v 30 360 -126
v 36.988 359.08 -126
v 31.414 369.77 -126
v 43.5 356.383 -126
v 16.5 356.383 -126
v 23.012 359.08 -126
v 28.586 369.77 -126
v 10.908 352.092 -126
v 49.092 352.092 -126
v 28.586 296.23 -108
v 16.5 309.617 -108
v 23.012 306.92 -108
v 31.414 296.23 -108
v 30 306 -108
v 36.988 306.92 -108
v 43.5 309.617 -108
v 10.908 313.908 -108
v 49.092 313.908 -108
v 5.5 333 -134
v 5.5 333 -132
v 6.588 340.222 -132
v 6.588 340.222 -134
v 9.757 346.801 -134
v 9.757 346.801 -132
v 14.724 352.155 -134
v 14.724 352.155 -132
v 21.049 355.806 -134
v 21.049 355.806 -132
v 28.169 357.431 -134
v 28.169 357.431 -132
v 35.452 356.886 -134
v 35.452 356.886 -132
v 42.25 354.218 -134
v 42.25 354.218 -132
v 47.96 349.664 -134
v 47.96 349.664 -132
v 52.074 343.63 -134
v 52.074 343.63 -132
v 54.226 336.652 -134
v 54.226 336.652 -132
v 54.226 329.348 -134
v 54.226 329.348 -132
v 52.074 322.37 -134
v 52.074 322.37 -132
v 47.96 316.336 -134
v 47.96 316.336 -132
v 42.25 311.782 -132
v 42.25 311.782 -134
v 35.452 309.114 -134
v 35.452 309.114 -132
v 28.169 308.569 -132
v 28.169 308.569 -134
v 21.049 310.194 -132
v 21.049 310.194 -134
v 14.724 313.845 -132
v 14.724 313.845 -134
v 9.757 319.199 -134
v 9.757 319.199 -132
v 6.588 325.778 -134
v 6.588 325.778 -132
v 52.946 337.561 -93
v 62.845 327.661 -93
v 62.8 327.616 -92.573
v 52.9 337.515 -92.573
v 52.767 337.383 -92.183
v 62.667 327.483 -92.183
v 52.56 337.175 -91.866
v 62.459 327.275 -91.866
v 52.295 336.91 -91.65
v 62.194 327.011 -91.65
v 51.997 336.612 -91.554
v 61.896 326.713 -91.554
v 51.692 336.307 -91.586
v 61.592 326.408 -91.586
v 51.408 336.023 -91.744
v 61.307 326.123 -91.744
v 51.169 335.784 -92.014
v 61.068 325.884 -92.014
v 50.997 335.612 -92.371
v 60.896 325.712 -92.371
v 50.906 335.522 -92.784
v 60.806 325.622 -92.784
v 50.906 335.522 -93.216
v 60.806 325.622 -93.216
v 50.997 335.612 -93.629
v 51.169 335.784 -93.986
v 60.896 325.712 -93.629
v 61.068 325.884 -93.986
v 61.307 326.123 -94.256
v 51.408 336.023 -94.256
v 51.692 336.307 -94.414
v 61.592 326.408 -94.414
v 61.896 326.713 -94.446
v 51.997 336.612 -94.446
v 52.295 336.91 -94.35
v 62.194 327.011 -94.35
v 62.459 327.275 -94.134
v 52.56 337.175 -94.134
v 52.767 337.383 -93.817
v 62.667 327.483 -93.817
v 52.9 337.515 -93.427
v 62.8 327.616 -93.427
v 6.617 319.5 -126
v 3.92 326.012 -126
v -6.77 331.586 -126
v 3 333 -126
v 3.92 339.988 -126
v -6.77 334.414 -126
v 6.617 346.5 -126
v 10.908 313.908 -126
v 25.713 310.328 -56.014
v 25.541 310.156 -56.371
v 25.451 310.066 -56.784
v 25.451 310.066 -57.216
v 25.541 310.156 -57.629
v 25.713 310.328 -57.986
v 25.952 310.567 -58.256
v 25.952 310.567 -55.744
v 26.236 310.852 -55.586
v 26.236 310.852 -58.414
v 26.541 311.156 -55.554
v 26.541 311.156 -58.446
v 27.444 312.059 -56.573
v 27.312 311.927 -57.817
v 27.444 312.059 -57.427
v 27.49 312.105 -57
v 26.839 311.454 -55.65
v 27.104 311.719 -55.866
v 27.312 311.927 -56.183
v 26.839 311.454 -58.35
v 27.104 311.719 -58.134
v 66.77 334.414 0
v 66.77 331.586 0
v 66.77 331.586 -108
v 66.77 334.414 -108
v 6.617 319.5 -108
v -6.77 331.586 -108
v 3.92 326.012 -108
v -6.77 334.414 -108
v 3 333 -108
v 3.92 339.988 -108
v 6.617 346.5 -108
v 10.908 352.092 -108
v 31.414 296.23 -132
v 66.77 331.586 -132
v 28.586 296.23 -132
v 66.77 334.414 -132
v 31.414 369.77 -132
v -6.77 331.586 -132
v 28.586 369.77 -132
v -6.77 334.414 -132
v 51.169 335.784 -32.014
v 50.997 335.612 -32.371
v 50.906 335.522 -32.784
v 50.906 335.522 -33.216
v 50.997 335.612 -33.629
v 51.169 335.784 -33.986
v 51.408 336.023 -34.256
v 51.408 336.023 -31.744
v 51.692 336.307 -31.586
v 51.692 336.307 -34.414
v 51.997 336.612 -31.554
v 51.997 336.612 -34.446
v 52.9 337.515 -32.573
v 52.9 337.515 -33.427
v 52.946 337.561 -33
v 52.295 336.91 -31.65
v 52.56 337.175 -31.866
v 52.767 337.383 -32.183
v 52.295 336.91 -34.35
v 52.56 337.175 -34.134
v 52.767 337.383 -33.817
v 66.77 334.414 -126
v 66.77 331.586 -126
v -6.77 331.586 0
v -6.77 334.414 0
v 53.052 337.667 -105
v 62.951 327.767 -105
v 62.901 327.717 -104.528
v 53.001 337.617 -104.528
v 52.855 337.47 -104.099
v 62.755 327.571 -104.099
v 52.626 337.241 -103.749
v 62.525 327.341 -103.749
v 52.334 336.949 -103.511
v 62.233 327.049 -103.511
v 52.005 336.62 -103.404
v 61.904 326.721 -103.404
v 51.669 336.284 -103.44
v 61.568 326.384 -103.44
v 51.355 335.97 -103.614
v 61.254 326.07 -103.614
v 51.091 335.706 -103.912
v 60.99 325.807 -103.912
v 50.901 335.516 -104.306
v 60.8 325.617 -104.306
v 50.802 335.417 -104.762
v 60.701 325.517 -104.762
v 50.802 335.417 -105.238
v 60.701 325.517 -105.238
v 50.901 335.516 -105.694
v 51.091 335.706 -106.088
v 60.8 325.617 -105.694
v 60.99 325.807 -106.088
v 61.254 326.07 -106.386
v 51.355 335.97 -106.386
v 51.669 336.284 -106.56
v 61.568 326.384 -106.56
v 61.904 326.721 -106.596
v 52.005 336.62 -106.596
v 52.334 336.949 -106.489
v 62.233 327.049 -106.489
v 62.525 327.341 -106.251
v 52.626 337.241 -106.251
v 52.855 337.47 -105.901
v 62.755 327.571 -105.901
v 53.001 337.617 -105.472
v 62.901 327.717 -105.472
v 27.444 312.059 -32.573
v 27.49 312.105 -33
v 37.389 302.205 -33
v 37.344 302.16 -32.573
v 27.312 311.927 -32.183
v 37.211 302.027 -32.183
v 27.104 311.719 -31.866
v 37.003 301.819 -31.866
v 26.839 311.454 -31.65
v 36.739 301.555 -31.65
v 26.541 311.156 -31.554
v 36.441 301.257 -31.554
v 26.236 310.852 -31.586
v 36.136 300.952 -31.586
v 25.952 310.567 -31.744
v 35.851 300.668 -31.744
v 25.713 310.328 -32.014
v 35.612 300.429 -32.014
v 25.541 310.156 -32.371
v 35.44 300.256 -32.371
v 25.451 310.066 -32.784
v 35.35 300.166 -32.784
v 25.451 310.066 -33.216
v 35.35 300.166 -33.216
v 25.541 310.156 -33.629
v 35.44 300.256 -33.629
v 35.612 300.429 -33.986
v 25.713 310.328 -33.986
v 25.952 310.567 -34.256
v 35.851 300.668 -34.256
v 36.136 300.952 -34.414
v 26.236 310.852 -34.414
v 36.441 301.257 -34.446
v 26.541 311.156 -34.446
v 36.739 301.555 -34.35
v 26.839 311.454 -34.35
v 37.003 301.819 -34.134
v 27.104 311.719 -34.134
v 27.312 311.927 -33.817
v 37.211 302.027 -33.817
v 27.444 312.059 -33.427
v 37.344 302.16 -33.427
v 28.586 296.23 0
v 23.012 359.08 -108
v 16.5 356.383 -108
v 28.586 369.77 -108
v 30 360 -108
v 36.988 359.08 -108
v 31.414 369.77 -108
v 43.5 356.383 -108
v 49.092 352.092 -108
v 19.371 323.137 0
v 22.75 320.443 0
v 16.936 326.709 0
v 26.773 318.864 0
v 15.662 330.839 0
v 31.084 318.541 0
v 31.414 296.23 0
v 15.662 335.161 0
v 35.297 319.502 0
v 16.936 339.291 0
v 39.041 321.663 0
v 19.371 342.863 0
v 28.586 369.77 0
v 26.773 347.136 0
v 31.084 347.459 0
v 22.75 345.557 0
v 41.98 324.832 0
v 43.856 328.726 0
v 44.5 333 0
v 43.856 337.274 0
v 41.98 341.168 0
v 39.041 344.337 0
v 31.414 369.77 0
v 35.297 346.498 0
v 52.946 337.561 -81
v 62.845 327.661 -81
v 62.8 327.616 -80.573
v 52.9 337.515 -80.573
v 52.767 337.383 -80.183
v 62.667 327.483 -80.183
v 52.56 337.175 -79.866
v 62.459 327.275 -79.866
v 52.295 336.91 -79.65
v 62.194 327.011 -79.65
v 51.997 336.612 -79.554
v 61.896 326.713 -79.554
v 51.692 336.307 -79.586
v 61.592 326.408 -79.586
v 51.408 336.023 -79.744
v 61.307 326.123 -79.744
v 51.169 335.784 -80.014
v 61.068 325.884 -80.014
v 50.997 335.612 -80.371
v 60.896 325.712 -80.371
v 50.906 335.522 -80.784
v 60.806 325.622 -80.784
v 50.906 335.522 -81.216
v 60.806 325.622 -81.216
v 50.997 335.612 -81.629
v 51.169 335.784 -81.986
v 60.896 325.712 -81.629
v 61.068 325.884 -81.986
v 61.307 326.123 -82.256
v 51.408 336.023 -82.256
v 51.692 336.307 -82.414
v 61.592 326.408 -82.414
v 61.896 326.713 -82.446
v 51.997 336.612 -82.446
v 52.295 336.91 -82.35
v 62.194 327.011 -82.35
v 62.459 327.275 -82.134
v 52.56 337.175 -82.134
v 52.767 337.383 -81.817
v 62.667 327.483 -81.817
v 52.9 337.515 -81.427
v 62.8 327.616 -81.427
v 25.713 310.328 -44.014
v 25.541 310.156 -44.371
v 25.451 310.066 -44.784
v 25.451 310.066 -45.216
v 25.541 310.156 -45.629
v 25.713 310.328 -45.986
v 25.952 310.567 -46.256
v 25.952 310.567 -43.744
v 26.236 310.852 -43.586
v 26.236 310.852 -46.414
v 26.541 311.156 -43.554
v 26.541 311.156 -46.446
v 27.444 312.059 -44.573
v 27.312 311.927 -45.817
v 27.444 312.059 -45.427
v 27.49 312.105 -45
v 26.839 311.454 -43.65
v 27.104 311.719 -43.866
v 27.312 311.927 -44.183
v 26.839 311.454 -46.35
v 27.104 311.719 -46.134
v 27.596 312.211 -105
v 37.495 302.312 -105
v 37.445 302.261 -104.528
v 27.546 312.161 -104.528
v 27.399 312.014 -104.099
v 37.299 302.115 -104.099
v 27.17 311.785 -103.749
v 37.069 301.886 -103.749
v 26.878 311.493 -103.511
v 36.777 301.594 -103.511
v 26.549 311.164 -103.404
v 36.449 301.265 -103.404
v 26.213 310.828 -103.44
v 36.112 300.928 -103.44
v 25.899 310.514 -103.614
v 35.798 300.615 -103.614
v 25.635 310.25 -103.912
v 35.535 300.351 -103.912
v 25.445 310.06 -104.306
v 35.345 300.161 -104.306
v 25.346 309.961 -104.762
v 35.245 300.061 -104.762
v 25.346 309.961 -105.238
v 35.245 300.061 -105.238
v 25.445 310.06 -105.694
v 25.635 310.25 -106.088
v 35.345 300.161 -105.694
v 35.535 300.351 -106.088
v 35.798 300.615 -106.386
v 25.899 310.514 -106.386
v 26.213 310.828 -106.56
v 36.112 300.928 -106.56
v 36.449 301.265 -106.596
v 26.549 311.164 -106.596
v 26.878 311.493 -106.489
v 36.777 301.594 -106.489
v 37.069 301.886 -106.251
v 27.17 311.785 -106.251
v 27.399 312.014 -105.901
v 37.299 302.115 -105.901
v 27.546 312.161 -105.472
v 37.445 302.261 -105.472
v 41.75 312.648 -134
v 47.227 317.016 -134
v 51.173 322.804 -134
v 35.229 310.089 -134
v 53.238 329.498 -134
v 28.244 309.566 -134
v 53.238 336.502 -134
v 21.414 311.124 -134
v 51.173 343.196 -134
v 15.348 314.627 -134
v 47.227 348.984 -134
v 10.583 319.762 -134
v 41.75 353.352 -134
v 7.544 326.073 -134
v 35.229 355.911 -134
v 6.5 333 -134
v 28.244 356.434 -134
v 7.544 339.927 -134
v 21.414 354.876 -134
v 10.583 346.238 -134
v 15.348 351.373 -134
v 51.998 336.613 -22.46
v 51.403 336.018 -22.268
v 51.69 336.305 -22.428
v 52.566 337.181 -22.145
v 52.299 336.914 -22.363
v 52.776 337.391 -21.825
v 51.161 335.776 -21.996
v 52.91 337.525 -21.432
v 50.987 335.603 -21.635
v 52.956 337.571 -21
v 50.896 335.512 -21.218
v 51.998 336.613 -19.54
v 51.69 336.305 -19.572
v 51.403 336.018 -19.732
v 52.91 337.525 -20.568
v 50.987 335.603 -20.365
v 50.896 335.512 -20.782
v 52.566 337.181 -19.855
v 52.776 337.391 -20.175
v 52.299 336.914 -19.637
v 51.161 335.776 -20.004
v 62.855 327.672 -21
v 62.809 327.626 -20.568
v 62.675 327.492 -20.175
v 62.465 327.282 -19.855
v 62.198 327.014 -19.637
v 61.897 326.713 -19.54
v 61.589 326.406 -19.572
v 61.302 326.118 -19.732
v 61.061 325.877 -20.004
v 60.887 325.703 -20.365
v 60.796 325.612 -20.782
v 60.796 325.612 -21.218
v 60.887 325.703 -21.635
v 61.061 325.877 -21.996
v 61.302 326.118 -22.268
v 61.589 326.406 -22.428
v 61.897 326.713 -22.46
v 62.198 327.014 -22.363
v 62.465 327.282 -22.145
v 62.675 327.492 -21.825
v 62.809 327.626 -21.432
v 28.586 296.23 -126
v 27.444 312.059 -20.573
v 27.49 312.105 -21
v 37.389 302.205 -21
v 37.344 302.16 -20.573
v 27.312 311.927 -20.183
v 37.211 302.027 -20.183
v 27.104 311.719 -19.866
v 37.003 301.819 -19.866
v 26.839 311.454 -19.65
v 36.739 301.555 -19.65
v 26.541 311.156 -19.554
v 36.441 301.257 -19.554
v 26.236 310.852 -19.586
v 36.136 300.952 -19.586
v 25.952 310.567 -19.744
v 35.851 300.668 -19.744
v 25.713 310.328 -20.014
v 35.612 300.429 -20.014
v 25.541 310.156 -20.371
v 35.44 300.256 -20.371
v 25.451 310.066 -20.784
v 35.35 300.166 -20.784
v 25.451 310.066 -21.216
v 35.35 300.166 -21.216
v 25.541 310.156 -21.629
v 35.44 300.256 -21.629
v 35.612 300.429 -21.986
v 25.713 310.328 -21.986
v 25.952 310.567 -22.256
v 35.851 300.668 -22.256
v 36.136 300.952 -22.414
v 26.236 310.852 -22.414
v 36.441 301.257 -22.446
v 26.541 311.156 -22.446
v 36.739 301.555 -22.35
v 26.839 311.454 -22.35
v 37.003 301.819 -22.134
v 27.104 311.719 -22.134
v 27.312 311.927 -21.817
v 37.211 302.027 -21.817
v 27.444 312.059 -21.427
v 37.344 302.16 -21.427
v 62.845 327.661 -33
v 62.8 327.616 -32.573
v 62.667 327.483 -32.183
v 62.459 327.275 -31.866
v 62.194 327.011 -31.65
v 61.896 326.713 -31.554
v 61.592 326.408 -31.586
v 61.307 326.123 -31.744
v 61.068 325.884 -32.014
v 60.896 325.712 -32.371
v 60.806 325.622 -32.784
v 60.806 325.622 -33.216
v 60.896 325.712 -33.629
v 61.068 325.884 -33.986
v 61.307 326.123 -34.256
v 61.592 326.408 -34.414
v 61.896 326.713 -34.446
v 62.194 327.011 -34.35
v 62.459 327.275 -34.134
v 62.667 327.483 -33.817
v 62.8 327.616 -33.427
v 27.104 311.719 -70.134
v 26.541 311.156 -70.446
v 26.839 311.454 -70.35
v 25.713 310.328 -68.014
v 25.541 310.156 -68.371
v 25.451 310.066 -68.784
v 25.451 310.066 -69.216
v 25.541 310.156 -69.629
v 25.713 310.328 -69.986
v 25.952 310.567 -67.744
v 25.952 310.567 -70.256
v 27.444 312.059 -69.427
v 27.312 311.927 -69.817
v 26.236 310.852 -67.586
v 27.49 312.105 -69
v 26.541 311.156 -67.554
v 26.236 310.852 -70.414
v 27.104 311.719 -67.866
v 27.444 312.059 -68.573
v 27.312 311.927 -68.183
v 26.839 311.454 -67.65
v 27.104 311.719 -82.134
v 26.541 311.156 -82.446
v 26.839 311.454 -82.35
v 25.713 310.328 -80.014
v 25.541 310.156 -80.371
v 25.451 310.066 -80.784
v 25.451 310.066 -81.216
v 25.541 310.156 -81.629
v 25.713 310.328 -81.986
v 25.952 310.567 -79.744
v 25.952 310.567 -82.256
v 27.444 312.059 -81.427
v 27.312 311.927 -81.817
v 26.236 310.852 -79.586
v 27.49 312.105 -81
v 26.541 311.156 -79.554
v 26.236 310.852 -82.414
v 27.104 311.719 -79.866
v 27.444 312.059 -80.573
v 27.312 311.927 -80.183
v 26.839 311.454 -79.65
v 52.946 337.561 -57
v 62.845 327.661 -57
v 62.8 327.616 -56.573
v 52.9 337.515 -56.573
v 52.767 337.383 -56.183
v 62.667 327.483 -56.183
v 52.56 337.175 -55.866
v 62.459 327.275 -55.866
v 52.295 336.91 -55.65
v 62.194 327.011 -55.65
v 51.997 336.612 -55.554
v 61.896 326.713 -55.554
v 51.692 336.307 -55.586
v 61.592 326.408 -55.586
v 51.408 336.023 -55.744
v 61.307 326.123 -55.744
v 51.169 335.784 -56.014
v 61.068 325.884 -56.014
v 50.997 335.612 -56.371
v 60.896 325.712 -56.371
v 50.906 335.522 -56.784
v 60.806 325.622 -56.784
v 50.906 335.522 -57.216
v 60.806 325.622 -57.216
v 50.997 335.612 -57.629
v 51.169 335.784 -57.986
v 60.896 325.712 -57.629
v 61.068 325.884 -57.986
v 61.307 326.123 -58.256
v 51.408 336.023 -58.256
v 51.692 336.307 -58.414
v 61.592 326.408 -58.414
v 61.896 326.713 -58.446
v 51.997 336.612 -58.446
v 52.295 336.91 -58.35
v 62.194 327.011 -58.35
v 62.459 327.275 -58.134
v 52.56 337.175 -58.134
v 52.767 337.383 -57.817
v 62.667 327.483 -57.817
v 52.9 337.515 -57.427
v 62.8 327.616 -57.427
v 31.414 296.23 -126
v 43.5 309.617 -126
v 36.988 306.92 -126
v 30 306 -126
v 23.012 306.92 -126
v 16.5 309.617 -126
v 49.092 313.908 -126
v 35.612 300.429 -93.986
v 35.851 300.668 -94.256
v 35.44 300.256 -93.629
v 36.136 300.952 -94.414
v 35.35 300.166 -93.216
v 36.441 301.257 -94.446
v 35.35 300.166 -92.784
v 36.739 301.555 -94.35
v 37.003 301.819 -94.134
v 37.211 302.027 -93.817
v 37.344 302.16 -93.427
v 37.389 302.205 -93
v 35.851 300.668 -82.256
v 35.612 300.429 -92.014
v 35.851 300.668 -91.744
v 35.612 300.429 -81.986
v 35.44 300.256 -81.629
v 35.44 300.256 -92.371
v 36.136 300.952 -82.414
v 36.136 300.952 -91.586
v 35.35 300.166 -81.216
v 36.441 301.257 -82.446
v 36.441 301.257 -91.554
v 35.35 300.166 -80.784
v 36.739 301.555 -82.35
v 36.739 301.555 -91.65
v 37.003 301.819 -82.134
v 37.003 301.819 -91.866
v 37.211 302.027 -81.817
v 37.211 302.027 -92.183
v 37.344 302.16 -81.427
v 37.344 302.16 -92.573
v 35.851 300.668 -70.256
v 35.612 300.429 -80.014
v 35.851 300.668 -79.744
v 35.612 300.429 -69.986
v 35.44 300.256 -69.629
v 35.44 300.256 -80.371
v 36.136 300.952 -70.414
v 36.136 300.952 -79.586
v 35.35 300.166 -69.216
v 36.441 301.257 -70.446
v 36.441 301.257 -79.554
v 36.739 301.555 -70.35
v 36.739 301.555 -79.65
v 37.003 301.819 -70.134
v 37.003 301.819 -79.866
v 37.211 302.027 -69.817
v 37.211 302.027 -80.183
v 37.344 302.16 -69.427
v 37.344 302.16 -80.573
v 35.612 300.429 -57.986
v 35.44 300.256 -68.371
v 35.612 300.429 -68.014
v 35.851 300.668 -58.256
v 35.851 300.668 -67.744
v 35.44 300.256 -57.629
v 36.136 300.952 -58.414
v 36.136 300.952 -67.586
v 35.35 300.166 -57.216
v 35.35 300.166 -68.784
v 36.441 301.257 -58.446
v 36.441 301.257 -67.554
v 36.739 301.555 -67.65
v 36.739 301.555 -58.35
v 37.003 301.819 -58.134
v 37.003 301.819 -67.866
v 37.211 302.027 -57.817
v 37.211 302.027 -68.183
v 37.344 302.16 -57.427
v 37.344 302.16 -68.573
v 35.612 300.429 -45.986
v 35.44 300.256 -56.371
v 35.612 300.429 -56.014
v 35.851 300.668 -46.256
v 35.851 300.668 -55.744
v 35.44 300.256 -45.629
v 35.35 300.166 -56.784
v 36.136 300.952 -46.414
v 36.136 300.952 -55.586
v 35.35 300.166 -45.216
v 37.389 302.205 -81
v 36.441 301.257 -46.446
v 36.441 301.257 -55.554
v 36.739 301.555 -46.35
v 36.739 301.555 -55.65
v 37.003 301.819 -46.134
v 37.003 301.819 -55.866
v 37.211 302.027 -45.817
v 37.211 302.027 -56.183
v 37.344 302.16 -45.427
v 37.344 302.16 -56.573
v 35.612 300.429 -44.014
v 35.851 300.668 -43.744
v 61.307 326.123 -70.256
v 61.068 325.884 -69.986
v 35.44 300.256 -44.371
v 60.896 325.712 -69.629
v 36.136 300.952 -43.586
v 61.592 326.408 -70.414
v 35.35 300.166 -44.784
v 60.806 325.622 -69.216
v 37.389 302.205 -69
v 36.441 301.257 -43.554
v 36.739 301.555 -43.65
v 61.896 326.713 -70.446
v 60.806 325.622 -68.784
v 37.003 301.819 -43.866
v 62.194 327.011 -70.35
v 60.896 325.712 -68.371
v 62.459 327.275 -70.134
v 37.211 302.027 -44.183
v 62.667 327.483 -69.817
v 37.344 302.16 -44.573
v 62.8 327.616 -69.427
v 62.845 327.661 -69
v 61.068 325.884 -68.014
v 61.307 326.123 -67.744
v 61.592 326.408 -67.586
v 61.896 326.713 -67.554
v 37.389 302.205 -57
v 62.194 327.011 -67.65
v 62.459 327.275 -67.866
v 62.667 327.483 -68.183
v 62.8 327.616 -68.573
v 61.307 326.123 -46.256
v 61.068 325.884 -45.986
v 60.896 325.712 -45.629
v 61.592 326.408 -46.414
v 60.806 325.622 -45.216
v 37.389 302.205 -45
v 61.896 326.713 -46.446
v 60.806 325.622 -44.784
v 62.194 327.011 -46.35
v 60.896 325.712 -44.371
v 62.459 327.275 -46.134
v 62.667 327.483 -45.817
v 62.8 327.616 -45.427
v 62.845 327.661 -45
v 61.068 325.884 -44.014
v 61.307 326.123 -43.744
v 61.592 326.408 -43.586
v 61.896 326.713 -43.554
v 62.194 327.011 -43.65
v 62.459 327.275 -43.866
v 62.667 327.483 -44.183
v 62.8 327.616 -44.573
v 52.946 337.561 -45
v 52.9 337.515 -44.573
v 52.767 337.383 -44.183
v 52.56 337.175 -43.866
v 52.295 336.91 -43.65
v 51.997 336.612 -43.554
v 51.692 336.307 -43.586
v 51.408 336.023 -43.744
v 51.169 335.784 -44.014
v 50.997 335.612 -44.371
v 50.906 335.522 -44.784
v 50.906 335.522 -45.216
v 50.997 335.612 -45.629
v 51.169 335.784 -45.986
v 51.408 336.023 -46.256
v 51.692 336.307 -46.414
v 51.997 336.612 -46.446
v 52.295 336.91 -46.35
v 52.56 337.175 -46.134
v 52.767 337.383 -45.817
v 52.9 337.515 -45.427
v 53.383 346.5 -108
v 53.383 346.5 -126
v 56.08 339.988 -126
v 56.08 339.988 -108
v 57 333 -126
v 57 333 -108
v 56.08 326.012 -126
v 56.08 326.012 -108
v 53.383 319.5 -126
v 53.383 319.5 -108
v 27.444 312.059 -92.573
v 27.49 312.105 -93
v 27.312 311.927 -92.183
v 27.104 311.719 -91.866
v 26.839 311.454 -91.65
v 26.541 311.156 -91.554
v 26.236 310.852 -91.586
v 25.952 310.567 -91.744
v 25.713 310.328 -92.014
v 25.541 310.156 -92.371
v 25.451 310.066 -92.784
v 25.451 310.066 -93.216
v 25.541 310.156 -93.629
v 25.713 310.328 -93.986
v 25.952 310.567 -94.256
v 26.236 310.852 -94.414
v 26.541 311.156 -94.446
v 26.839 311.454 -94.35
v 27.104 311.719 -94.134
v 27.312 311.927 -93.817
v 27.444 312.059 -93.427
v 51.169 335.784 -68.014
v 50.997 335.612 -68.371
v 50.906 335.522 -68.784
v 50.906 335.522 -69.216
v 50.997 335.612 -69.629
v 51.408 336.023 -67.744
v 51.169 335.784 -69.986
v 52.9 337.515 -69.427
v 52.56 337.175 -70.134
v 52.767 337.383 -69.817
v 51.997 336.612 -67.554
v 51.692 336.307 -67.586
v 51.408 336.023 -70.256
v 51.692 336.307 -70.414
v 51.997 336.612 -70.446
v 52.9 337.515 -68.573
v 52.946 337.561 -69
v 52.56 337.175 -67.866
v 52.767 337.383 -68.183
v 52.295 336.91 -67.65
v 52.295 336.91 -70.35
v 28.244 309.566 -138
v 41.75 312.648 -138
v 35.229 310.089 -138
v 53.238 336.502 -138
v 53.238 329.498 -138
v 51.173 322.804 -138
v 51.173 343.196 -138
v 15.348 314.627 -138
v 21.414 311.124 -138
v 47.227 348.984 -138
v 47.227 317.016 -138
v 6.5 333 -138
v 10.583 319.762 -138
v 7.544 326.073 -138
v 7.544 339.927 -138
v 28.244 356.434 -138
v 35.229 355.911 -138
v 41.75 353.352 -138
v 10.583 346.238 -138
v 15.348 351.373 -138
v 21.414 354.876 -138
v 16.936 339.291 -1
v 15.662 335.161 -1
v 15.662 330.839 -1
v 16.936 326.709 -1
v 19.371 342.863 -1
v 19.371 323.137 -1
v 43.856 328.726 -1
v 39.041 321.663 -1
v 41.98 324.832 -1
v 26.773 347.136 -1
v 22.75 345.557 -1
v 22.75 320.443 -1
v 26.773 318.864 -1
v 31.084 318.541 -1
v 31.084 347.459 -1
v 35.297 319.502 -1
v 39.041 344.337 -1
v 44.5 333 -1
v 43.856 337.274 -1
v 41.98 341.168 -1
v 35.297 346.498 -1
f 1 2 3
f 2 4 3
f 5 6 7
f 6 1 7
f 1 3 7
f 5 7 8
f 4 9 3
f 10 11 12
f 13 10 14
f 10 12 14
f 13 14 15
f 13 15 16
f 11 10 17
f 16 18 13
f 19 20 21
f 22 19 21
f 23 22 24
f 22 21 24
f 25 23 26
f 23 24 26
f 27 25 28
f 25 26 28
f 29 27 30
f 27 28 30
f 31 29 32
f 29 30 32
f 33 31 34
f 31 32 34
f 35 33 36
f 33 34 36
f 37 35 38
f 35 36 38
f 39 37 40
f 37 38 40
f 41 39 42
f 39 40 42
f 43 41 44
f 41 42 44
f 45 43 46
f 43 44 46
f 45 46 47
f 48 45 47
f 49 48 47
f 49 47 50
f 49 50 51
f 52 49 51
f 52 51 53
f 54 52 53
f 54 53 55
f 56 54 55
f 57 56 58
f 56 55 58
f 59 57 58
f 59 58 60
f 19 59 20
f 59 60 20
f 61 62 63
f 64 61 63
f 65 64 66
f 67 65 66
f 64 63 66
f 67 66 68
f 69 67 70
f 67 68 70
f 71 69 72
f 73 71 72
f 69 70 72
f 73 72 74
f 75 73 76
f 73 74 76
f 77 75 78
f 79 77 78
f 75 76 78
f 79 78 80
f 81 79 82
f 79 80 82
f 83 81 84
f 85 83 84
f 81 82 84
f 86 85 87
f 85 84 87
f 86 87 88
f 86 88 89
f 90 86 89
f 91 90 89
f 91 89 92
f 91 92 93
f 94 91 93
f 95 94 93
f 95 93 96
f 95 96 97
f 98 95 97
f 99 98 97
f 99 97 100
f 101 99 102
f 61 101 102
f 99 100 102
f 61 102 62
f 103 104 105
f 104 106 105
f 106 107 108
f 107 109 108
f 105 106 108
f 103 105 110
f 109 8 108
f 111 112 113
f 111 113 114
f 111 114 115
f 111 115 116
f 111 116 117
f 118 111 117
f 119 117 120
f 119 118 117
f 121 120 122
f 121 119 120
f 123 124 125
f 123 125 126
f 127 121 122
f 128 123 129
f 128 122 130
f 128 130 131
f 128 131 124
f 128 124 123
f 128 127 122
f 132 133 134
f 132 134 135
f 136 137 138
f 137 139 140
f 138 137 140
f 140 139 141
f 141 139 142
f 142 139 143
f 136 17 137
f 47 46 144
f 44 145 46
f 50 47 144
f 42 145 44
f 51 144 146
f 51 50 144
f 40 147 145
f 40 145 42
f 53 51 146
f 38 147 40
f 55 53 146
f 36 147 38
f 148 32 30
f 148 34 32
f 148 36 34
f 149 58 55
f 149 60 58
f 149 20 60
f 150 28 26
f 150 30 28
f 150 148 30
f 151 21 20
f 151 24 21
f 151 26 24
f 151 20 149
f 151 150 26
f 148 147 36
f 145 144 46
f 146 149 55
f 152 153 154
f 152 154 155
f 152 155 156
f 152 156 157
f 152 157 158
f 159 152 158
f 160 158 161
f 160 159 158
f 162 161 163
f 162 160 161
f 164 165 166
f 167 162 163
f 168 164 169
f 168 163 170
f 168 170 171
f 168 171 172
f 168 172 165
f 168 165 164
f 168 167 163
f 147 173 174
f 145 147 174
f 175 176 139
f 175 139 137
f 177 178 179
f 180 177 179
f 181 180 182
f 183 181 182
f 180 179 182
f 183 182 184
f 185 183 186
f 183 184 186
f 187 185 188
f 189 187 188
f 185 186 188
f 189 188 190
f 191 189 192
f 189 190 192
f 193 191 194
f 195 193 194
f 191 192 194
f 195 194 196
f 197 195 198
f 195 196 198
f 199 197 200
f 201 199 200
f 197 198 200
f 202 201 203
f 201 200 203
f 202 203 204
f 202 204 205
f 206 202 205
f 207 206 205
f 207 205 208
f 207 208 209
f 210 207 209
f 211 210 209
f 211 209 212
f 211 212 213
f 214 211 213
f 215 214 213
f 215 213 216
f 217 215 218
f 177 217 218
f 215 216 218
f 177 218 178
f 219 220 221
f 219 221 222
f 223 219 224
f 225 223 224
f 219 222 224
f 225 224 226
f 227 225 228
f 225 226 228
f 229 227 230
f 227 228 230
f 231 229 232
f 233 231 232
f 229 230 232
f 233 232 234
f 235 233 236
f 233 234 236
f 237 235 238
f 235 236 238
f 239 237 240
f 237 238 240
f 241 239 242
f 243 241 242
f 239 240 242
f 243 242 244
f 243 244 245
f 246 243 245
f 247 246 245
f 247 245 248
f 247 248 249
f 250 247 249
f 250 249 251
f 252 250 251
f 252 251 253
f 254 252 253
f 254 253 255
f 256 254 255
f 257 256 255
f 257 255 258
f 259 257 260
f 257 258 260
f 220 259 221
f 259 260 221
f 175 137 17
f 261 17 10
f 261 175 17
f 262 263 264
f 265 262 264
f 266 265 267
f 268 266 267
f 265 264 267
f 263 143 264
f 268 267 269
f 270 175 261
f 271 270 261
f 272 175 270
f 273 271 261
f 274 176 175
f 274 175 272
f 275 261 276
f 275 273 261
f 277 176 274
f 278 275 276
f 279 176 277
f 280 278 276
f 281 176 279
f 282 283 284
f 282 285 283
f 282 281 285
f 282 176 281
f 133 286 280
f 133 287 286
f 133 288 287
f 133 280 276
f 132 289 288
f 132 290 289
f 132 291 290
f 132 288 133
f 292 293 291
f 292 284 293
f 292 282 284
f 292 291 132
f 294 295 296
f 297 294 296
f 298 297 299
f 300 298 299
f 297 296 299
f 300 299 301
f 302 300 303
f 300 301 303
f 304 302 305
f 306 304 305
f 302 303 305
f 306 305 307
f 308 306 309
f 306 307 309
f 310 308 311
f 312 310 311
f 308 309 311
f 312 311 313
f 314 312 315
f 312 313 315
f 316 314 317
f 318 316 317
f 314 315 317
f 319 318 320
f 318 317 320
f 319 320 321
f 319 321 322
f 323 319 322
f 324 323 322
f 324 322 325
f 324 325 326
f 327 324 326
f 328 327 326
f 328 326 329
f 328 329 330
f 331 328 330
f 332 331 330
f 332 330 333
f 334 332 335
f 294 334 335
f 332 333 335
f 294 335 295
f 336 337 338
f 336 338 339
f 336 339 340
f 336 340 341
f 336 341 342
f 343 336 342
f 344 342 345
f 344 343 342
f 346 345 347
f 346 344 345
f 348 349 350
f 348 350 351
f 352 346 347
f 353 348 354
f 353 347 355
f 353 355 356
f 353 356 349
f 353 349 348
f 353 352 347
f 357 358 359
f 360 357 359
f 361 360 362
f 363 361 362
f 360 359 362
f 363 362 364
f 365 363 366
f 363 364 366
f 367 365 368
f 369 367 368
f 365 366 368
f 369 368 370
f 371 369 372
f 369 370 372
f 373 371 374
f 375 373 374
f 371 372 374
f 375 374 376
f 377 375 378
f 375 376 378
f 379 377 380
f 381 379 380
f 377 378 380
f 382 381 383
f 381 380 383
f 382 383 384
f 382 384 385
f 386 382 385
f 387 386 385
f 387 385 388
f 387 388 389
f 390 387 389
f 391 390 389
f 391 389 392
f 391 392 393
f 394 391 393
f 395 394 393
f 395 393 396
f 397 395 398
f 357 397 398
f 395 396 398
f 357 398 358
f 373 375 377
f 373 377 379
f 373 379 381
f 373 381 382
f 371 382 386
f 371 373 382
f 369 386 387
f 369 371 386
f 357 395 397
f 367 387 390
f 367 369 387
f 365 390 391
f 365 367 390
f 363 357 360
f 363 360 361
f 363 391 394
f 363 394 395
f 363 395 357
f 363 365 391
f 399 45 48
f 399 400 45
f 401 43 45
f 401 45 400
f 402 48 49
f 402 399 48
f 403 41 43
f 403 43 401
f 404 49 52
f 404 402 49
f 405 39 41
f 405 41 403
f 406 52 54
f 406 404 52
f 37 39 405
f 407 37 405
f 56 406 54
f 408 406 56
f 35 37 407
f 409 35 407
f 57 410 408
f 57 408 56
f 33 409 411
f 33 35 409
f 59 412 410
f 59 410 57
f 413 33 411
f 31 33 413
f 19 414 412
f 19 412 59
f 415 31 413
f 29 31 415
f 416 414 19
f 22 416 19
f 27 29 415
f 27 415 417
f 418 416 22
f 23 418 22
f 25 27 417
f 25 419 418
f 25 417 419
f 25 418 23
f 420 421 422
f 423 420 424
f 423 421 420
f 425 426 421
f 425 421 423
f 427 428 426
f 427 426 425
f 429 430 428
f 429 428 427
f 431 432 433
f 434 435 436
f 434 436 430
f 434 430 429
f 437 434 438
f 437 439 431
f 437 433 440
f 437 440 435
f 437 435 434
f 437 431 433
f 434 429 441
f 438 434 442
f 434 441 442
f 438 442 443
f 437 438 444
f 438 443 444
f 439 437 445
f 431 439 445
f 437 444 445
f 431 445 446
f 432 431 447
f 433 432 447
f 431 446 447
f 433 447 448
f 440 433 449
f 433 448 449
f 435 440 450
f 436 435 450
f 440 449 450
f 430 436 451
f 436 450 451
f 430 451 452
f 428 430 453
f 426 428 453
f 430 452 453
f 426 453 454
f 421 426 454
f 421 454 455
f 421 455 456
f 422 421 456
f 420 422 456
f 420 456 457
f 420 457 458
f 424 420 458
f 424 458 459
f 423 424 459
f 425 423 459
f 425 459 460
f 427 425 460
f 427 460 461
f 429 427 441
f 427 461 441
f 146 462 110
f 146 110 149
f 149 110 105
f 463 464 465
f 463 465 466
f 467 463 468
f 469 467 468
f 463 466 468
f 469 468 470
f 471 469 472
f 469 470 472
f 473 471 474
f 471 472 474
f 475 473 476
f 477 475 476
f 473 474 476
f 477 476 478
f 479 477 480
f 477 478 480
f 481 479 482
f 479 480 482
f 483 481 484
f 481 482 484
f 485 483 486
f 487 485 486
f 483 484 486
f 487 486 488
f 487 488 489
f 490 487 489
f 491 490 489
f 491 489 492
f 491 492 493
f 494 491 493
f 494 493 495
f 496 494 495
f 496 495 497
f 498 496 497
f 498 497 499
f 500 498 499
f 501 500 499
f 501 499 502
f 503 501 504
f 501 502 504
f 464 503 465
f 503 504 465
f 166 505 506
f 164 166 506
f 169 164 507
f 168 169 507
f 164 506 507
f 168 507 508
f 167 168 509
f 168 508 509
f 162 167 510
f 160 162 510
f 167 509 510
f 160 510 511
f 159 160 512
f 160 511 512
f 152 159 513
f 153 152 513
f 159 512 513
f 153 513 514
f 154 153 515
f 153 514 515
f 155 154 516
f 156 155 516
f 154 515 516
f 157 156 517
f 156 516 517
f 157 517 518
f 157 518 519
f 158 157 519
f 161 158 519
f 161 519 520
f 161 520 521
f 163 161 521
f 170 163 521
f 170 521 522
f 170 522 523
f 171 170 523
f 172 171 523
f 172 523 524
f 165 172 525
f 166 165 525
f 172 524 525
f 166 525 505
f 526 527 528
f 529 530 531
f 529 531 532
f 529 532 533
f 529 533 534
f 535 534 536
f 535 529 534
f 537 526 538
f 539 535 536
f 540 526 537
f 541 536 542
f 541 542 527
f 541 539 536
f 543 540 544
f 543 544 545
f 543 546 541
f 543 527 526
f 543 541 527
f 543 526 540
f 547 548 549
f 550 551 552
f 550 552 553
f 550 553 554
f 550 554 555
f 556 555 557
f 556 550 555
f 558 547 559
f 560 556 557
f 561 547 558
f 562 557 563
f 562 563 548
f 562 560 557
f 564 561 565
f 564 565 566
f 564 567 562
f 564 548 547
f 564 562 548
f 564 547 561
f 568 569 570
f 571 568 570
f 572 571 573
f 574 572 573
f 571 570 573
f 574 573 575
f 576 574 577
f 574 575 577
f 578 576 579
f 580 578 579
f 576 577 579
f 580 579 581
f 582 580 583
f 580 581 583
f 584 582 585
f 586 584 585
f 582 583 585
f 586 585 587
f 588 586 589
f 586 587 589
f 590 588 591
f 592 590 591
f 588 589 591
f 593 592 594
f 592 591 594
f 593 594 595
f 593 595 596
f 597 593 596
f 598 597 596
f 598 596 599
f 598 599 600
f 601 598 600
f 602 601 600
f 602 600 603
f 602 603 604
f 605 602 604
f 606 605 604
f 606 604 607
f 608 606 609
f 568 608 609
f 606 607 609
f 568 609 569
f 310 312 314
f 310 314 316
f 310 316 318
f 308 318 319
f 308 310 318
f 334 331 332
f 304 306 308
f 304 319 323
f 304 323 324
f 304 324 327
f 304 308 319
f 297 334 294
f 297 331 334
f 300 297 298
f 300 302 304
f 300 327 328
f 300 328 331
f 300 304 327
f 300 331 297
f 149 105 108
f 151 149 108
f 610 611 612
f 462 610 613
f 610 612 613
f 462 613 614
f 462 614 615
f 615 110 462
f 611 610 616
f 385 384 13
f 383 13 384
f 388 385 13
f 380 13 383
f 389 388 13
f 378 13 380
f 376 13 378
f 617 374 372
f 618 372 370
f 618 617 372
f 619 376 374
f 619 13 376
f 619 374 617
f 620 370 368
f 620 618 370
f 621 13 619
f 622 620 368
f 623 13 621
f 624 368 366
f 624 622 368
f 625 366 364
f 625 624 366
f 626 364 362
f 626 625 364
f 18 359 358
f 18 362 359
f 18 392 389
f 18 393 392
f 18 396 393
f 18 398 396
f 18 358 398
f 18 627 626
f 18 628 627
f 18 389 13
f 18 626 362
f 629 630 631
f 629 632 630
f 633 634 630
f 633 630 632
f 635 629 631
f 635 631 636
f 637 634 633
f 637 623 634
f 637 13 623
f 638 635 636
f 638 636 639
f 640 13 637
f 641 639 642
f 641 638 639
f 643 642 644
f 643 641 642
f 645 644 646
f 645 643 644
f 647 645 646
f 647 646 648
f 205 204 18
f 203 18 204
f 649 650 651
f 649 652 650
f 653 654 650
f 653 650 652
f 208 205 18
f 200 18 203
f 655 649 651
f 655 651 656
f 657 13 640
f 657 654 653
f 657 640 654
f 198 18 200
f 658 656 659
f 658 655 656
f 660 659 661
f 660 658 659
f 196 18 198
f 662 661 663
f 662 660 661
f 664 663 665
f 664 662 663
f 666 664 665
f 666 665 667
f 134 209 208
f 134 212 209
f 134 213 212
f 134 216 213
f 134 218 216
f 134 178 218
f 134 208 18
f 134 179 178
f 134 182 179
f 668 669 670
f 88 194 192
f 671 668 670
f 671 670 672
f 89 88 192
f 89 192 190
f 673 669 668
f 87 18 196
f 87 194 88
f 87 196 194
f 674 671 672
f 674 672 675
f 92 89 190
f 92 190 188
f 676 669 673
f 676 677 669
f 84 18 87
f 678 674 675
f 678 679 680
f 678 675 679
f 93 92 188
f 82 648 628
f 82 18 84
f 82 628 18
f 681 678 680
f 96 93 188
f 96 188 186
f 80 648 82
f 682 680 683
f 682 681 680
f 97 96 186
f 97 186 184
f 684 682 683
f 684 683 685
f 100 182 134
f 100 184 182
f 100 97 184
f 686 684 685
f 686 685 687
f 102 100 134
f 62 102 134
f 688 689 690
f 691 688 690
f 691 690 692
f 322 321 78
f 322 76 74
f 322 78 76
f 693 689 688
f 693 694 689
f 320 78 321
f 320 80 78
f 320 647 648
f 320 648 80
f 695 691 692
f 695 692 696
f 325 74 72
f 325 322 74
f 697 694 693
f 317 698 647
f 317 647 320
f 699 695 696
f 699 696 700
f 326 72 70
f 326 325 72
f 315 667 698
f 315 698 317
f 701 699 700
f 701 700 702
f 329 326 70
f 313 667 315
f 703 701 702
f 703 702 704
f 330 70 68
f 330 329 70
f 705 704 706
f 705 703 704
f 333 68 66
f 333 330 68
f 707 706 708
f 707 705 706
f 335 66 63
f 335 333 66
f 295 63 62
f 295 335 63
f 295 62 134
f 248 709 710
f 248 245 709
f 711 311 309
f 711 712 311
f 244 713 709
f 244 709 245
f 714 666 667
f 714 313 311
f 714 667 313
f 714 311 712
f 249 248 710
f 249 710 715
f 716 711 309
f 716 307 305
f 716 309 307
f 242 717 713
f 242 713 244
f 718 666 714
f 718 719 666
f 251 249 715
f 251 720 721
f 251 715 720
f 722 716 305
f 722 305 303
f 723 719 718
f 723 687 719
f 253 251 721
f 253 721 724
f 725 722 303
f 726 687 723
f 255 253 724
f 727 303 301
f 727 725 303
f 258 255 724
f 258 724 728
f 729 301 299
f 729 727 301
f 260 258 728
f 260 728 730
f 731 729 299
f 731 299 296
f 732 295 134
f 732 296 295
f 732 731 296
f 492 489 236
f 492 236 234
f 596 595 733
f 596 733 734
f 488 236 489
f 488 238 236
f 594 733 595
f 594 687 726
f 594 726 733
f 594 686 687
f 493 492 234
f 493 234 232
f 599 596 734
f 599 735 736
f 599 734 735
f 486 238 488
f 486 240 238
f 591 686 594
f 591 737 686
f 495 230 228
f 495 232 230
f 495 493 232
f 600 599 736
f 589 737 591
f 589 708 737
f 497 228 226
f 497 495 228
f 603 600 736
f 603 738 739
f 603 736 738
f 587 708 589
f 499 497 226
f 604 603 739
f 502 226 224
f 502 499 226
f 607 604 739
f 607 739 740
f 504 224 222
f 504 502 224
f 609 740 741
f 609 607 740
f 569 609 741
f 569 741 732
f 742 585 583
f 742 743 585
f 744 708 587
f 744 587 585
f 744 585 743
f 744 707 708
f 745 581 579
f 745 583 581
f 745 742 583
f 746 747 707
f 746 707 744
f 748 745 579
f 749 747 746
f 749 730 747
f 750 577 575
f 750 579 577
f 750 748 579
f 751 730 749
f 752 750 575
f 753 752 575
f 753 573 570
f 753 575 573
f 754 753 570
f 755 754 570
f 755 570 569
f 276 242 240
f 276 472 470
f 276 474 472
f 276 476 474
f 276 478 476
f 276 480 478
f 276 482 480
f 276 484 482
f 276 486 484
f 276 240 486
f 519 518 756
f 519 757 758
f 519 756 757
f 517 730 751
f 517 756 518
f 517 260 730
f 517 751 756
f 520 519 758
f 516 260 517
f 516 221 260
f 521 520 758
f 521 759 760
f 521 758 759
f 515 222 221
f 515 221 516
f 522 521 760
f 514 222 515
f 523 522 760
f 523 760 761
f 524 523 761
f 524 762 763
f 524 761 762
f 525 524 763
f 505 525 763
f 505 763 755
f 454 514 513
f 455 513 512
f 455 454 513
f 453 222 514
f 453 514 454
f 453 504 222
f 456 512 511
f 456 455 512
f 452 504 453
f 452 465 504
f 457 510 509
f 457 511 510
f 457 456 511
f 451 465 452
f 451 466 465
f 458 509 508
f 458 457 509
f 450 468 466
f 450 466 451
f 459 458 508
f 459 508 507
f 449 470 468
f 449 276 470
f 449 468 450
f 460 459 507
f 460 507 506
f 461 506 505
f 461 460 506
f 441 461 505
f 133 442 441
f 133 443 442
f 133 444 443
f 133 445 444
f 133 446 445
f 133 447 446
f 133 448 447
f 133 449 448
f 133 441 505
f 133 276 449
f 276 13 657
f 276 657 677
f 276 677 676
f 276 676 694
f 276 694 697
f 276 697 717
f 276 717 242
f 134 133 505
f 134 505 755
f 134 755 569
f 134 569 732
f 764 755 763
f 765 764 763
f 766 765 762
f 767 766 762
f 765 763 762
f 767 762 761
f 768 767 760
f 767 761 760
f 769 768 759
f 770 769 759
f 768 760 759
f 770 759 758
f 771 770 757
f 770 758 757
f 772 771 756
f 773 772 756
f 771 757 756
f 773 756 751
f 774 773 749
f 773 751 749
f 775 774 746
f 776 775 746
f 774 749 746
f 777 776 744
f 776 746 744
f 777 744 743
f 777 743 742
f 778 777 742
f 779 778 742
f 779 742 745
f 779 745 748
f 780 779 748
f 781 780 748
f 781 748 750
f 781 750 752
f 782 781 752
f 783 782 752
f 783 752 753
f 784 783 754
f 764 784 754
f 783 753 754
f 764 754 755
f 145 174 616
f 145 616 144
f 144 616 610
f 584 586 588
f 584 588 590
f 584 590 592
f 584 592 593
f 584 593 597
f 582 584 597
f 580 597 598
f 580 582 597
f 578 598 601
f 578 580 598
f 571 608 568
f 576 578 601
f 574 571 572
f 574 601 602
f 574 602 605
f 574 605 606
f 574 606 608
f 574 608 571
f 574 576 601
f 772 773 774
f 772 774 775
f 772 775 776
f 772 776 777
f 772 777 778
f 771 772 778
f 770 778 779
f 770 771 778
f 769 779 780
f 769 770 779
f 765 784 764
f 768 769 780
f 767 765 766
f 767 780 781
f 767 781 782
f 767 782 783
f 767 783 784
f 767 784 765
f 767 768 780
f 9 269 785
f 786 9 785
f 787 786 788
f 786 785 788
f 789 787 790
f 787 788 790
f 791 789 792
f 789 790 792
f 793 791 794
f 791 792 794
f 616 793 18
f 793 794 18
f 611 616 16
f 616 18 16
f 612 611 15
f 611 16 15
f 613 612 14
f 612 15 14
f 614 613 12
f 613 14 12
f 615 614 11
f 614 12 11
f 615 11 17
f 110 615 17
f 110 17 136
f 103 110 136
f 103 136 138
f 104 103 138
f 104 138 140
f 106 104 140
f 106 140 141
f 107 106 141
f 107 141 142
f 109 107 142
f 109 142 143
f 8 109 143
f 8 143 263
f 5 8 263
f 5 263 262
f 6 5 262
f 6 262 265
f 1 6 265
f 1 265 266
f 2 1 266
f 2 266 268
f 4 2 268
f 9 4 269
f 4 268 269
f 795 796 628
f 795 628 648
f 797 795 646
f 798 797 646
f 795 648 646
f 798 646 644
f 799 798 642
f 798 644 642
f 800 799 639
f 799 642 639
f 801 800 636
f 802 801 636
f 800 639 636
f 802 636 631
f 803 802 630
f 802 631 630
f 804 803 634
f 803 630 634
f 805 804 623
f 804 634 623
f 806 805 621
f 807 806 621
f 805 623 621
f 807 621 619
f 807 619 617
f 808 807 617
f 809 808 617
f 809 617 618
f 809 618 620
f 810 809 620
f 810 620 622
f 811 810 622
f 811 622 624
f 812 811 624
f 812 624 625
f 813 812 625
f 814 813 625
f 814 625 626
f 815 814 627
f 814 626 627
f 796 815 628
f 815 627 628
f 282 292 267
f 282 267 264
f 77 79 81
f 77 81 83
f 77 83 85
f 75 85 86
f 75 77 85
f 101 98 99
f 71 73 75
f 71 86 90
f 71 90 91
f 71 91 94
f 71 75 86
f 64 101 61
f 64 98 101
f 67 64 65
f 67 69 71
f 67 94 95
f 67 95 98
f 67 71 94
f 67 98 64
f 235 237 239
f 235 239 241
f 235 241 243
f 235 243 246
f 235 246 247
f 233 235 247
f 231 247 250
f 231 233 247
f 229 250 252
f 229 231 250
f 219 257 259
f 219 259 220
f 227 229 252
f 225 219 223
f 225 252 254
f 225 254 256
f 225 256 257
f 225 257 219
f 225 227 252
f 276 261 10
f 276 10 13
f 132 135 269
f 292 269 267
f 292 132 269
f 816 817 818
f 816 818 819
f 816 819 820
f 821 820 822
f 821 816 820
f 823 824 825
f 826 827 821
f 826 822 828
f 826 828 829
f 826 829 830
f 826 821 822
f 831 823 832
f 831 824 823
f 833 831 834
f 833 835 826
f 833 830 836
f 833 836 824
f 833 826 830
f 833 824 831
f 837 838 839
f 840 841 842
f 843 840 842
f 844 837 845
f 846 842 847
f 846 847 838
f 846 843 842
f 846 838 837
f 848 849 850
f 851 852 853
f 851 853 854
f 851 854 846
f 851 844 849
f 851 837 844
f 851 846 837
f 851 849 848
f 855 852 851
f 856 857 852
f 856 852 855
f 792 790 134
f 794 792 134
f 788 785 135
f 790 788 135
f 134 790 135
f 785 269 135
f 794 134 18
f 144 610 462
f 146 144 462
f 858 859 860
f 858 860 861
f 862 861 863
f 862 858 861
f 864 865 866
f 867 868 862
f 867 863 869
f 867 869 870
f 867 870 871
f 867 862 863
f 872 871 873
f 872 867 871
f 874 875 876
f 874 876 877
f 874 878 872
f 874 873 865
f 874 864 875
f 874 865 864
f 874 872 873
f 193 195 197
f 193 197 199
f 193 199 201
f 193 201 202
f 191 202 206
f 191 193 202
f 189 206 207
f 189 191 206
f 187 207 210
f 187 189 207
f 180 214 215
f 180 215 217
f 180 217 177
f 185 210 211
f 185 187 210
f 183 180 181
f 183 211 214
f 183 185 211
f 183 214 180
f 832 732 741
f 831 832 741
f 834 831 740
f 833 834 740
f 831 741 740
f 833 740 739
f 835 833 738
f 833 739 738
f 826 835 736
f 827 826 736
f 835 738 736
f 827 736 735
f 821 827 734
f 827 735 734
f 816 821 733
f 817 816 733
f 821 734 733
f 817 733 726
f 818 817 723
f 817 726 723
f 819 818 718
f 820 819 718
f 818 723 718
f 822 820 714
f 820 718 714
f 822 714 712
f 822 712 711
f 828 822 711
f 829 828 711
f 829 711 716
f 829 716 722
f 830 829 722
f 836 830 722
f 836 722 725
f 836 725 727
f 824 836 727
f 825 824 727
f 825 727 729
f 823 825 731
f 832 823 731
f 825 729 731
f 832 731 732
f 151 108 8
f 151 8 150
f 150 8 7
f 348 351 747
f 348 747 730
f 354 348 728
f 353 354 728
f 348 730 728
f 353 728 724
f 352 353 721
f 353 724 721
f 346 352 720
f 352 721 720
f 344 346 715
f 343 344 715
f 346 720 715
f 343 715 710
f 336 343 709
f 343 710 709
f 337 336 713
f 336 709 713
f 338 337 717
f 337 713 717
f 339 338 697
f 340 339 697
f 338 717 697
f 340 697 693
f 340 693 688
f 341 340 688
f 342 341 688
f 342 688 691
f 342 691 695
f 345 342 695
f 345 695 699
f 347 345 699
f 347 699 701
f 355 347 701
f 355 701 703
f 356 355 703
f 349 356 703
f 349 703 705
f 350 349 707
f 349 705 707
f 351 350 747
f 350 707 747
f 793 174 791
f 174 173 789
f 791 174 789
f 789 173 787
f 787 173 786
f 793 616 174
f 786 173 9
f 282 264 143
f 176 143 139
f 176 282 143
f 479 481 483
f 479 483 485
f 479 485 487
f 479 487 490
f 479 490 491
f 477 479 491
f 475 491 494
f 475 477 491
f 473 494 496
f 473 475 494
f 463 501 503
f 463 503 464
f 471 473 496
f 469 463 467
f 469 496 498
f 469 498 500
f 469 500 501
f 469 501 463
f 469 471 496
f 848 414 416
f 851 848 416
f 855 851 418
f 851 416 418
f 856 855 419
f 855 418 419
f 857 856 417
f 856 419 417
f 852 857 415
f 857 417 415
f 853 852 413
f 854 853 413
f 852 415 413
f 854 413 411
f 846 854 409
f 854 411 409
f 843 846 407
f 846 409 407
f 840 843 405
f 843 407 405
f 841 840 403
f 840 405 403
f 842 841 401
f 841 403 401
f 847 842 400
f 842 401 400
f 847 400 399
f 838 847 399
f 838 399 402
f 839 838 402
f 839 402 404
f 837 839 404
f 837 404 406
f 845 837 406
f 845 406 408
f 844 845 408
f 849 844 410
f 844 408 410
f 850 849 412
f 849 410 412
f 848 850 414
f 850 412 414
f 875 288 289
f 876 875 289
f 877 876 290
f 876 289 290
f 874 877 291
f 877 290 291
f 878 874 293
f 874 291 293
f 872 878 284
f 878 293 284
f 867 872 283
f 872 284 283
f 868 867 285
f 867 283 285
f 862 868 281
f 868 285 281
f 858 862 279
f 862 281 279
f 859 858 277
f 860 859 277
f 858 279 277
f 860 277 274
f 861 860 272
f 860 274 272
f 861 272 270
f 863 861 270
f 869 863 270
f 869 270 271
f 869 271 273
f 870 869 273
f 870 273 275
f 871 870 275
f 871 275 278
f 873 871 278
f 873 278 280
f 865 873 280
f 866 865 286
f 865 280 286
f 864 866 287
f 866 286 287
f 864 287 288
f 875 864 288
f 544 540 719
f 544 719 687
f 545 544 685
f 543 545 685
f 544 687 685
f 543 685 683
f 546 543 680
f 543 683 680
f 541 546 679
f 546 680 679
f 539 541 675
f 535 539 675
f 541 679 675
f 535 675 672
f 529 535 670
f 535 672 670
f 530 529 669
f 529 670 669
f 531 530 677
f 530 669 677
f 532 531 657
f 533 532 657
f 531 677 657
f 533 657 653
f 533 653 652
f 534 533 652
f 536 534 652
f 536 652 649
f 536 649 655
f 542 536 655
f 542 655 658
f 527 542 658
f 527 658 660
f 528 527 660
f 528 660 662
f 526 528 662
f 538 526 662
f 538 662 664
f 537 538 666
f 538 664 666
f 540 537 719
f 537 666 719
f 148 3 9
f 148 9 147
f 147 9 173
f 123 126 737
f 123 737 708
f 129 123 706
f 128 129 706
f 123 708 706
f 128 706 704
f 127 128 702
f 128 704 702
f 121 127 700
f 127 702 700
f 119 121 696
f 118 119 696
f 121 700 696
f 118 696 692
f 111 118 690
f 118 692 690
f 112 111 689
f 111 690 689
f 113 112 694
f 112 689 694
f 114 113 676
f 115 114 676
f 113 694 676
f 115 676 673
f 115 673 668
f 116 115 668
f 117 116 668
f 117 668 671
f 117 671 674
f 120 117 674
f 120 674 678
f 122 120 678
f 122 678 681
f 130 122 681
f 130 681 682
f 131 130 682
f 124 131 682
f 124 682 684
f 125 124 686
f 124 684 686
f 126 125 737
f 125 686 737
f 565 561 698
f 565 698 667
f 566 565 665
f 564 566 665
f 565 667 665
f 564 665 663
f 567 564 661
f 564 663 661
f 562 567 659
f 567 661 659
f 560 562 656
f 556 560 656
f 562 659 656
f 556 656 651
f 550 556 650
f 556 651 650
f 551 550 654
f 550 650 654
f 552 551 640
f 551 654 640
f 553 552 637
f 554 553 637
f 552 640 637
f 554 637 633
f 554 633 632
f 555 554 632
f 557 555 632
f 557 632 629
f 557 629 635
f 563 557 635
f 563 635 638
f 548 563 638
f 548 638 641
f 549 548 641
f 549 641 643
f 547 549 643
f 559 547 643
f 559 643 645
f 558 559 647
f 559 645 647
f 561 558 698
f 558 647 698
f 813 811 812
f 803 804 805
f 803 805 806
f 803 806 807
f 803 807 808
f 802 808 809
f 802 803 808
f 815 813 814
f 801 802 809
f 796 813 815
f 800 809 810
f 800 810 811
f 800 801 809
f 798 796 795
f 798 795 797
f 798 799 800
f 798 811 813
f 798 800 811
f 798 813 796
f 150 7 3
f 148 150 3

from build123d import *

# Parameters (mm, degrees)
EXTRUDE_1_DEPTH     = 108
SKETCH_2_R          = 27
EXTRUDE_2_DEPTH     = 18
EXTRUDE_3_DEPTH     = 6
SKETCH_4_R          = 24.5
EXTRUDE_4_DEPTH     = 2
SKETCH_5_R          = 23.5
EXTRUDE_5_DEPTH     = 4
SKETCH_7_R          = 1.6
SKETCH_7_R_2        = 1.45
SKETCH_7_R_3        = 1.464509856
CUT_EXTRUDE_1_DEPTH = 14
SKETCH_8_R          = 14.5
CUT_EXTRUDE_2_DEPTH = 1


with BuildPart() as part:
    # 스케치1 → 보스-돌출1 (new body)
    with BuildSketch(Plane.XY):
        Polygon((-6.769552622, 334.414213562), (-6.769552622, 331.585786438), (28.585786438, 296.230447378), (31.414213562, 296.230447378), (66.769552622, 331.585786438), (66.769552622, 334.414213562), (31.414213562, 369.769552622), (28.585786438, 369.769552622), align=None)
    extrude(amount=-EXTRUDE_1_DEPTH)

    # 스케치2 → 보스-돌출2 (add)
    with BuildSketch(Plane(origin=(0, 0, -108), x_dir=(-1, 0, 0), z_dir=(0, 0, -1))):
        with Locations(Location((-30, 333, 0), (0, 0, 135))):
            Circle(SKETCH_2_R)
    extrude(amount=EXTRUDE_2_DEPTH)

    # 스케치3 → 보스-돌출3 (add)
    with BuildSketch(Plane(origin=(0, 0, -126), x_dir=(-1, 0, 0), z_dir=(0, 0, -1))):
        Polygon((6.769552622, 331.585786438), (6.769552622, 334.414213562), (-28.585786438, 369.769552622), (-31.414213562, 369.769552622), (-66.769552622, 334.414213562), (-66.769552622, 331.585786438), (-31.414213562, 296.230447378), (-28.585786438, 296.230447378), align=None)
    extrude(amount=EXTRUDE_3_DEPTH)

    # 스케치4 → 보스-돌출4 (add)
    with BuildSketch(Plane(origin=(0, 0, -132), x_dir=(-1, 0, 0), z_dir=(0, 0, -1))):
        with Locations((-30, 333)):
            Circle(SKETCH_4_R)
    extrude(amount=EXTRUDE_4_DEPTH)

    # 스케치5 → 보스-돌출5 (add)
    with BuildSketch(Plane(origin=(0, 0, -134), x_dir=(-1, 0, 0), z_dir=(0, 0, -1))):
        with Locations((-30, 333)):
            Circle(SKETCH_5_R)
    extrude(amount=EXTRUDE_5_DEPTH)

    # 스케치7 → 컷-돌출1 (cut)
    with BuildSketch(Plane(origin=(-132.408116908, 132.408116908, 0), x_dir=(0, 0, -1), z_dir=(0.7071067811863883, -0.7071067811867069, 0))):
        with Locations(Location((105, 274.679761571, 0), (0, 0, 90))):
            Circle(SKETCH_7_R)
        with Locations(Location((93, 274.679761571, 0), (0, 0, 90))):
            Circle(SKETCH_7_R_2)
        with Locations(Location((81, 274.679761571, 0), (0, 0, 90))):
            Circle(SKETCH_7_R_2)
        with Locations(Location((69, 274.679761571, 0), (0, 0, 90))):
            Circle(SKETCH_7_R_2)
        with Locations(Location((57, 274.679761571, 0), (0, 0, 90))):
            Circle(SKETCH_7_R_2)
        with Locations(Location((45, 274.679761571, 0), (0, 0, 90))):
            Circle(SKETCH_7_R_2)
        with Locations(Location((33, 274.679761571, 0), (0, 0, 90))):
            Circle(SKETCH_7_R_2)
        with Locations(Location((21, 274.679761571, 0), (0, 0, 90))):
            Circle(SKETCH_7_R_3)
        with Locations(Location((21, 238.679761571, 0), (0, 0, 90))):
            Circle(SKETCH_7_R_2)
        with Locations(Location((33, 238.679761571, 0), (0, 0, 90))):
            Circle(SKETCH_7_R_2)
        with Locations(Location((45, 238.679761571, 0), (0, 0, 90))):
            Circle(SKETCH_7_R_2)
        with Locations(Location((57, 238.679761571, 0), (0, 0, 90))):
            Circle(SKETCH_7_R_2)
        with Locations(Location((69, 238.679761571, 0), (0, 0, 90))):
            Circle(SKETCH_7_R_2)
        with Locations(Location((81, 238.679761571, 0), (0, 0, 90))):
            Circle(SKETCH_7_R_2)
        with Locations(Location((93, 238.679761571, 0), (0, 0, 90))):
            Circle(SKETCH_7_R_2)
        with Locations(Location((105, 238.679761571, 0), (0, 0, 90))):
            Circle(SKETCH_7_R)
    extrude(amount=-CUT_EXTRUDE_1_DEPTH, mode=Mode.SUBTRACT)

    # 스케치8 → 컷-돌출2 (cut)
    with BuildSketch(Plane.XY):
        with Locations((30, 333)):
            Circle(SKETCH_8_R)
    extrude(amount=-CUT_EXTRUDE_2_DEPTH, mode=Mode.SUBTRACT)


solid = part.part
